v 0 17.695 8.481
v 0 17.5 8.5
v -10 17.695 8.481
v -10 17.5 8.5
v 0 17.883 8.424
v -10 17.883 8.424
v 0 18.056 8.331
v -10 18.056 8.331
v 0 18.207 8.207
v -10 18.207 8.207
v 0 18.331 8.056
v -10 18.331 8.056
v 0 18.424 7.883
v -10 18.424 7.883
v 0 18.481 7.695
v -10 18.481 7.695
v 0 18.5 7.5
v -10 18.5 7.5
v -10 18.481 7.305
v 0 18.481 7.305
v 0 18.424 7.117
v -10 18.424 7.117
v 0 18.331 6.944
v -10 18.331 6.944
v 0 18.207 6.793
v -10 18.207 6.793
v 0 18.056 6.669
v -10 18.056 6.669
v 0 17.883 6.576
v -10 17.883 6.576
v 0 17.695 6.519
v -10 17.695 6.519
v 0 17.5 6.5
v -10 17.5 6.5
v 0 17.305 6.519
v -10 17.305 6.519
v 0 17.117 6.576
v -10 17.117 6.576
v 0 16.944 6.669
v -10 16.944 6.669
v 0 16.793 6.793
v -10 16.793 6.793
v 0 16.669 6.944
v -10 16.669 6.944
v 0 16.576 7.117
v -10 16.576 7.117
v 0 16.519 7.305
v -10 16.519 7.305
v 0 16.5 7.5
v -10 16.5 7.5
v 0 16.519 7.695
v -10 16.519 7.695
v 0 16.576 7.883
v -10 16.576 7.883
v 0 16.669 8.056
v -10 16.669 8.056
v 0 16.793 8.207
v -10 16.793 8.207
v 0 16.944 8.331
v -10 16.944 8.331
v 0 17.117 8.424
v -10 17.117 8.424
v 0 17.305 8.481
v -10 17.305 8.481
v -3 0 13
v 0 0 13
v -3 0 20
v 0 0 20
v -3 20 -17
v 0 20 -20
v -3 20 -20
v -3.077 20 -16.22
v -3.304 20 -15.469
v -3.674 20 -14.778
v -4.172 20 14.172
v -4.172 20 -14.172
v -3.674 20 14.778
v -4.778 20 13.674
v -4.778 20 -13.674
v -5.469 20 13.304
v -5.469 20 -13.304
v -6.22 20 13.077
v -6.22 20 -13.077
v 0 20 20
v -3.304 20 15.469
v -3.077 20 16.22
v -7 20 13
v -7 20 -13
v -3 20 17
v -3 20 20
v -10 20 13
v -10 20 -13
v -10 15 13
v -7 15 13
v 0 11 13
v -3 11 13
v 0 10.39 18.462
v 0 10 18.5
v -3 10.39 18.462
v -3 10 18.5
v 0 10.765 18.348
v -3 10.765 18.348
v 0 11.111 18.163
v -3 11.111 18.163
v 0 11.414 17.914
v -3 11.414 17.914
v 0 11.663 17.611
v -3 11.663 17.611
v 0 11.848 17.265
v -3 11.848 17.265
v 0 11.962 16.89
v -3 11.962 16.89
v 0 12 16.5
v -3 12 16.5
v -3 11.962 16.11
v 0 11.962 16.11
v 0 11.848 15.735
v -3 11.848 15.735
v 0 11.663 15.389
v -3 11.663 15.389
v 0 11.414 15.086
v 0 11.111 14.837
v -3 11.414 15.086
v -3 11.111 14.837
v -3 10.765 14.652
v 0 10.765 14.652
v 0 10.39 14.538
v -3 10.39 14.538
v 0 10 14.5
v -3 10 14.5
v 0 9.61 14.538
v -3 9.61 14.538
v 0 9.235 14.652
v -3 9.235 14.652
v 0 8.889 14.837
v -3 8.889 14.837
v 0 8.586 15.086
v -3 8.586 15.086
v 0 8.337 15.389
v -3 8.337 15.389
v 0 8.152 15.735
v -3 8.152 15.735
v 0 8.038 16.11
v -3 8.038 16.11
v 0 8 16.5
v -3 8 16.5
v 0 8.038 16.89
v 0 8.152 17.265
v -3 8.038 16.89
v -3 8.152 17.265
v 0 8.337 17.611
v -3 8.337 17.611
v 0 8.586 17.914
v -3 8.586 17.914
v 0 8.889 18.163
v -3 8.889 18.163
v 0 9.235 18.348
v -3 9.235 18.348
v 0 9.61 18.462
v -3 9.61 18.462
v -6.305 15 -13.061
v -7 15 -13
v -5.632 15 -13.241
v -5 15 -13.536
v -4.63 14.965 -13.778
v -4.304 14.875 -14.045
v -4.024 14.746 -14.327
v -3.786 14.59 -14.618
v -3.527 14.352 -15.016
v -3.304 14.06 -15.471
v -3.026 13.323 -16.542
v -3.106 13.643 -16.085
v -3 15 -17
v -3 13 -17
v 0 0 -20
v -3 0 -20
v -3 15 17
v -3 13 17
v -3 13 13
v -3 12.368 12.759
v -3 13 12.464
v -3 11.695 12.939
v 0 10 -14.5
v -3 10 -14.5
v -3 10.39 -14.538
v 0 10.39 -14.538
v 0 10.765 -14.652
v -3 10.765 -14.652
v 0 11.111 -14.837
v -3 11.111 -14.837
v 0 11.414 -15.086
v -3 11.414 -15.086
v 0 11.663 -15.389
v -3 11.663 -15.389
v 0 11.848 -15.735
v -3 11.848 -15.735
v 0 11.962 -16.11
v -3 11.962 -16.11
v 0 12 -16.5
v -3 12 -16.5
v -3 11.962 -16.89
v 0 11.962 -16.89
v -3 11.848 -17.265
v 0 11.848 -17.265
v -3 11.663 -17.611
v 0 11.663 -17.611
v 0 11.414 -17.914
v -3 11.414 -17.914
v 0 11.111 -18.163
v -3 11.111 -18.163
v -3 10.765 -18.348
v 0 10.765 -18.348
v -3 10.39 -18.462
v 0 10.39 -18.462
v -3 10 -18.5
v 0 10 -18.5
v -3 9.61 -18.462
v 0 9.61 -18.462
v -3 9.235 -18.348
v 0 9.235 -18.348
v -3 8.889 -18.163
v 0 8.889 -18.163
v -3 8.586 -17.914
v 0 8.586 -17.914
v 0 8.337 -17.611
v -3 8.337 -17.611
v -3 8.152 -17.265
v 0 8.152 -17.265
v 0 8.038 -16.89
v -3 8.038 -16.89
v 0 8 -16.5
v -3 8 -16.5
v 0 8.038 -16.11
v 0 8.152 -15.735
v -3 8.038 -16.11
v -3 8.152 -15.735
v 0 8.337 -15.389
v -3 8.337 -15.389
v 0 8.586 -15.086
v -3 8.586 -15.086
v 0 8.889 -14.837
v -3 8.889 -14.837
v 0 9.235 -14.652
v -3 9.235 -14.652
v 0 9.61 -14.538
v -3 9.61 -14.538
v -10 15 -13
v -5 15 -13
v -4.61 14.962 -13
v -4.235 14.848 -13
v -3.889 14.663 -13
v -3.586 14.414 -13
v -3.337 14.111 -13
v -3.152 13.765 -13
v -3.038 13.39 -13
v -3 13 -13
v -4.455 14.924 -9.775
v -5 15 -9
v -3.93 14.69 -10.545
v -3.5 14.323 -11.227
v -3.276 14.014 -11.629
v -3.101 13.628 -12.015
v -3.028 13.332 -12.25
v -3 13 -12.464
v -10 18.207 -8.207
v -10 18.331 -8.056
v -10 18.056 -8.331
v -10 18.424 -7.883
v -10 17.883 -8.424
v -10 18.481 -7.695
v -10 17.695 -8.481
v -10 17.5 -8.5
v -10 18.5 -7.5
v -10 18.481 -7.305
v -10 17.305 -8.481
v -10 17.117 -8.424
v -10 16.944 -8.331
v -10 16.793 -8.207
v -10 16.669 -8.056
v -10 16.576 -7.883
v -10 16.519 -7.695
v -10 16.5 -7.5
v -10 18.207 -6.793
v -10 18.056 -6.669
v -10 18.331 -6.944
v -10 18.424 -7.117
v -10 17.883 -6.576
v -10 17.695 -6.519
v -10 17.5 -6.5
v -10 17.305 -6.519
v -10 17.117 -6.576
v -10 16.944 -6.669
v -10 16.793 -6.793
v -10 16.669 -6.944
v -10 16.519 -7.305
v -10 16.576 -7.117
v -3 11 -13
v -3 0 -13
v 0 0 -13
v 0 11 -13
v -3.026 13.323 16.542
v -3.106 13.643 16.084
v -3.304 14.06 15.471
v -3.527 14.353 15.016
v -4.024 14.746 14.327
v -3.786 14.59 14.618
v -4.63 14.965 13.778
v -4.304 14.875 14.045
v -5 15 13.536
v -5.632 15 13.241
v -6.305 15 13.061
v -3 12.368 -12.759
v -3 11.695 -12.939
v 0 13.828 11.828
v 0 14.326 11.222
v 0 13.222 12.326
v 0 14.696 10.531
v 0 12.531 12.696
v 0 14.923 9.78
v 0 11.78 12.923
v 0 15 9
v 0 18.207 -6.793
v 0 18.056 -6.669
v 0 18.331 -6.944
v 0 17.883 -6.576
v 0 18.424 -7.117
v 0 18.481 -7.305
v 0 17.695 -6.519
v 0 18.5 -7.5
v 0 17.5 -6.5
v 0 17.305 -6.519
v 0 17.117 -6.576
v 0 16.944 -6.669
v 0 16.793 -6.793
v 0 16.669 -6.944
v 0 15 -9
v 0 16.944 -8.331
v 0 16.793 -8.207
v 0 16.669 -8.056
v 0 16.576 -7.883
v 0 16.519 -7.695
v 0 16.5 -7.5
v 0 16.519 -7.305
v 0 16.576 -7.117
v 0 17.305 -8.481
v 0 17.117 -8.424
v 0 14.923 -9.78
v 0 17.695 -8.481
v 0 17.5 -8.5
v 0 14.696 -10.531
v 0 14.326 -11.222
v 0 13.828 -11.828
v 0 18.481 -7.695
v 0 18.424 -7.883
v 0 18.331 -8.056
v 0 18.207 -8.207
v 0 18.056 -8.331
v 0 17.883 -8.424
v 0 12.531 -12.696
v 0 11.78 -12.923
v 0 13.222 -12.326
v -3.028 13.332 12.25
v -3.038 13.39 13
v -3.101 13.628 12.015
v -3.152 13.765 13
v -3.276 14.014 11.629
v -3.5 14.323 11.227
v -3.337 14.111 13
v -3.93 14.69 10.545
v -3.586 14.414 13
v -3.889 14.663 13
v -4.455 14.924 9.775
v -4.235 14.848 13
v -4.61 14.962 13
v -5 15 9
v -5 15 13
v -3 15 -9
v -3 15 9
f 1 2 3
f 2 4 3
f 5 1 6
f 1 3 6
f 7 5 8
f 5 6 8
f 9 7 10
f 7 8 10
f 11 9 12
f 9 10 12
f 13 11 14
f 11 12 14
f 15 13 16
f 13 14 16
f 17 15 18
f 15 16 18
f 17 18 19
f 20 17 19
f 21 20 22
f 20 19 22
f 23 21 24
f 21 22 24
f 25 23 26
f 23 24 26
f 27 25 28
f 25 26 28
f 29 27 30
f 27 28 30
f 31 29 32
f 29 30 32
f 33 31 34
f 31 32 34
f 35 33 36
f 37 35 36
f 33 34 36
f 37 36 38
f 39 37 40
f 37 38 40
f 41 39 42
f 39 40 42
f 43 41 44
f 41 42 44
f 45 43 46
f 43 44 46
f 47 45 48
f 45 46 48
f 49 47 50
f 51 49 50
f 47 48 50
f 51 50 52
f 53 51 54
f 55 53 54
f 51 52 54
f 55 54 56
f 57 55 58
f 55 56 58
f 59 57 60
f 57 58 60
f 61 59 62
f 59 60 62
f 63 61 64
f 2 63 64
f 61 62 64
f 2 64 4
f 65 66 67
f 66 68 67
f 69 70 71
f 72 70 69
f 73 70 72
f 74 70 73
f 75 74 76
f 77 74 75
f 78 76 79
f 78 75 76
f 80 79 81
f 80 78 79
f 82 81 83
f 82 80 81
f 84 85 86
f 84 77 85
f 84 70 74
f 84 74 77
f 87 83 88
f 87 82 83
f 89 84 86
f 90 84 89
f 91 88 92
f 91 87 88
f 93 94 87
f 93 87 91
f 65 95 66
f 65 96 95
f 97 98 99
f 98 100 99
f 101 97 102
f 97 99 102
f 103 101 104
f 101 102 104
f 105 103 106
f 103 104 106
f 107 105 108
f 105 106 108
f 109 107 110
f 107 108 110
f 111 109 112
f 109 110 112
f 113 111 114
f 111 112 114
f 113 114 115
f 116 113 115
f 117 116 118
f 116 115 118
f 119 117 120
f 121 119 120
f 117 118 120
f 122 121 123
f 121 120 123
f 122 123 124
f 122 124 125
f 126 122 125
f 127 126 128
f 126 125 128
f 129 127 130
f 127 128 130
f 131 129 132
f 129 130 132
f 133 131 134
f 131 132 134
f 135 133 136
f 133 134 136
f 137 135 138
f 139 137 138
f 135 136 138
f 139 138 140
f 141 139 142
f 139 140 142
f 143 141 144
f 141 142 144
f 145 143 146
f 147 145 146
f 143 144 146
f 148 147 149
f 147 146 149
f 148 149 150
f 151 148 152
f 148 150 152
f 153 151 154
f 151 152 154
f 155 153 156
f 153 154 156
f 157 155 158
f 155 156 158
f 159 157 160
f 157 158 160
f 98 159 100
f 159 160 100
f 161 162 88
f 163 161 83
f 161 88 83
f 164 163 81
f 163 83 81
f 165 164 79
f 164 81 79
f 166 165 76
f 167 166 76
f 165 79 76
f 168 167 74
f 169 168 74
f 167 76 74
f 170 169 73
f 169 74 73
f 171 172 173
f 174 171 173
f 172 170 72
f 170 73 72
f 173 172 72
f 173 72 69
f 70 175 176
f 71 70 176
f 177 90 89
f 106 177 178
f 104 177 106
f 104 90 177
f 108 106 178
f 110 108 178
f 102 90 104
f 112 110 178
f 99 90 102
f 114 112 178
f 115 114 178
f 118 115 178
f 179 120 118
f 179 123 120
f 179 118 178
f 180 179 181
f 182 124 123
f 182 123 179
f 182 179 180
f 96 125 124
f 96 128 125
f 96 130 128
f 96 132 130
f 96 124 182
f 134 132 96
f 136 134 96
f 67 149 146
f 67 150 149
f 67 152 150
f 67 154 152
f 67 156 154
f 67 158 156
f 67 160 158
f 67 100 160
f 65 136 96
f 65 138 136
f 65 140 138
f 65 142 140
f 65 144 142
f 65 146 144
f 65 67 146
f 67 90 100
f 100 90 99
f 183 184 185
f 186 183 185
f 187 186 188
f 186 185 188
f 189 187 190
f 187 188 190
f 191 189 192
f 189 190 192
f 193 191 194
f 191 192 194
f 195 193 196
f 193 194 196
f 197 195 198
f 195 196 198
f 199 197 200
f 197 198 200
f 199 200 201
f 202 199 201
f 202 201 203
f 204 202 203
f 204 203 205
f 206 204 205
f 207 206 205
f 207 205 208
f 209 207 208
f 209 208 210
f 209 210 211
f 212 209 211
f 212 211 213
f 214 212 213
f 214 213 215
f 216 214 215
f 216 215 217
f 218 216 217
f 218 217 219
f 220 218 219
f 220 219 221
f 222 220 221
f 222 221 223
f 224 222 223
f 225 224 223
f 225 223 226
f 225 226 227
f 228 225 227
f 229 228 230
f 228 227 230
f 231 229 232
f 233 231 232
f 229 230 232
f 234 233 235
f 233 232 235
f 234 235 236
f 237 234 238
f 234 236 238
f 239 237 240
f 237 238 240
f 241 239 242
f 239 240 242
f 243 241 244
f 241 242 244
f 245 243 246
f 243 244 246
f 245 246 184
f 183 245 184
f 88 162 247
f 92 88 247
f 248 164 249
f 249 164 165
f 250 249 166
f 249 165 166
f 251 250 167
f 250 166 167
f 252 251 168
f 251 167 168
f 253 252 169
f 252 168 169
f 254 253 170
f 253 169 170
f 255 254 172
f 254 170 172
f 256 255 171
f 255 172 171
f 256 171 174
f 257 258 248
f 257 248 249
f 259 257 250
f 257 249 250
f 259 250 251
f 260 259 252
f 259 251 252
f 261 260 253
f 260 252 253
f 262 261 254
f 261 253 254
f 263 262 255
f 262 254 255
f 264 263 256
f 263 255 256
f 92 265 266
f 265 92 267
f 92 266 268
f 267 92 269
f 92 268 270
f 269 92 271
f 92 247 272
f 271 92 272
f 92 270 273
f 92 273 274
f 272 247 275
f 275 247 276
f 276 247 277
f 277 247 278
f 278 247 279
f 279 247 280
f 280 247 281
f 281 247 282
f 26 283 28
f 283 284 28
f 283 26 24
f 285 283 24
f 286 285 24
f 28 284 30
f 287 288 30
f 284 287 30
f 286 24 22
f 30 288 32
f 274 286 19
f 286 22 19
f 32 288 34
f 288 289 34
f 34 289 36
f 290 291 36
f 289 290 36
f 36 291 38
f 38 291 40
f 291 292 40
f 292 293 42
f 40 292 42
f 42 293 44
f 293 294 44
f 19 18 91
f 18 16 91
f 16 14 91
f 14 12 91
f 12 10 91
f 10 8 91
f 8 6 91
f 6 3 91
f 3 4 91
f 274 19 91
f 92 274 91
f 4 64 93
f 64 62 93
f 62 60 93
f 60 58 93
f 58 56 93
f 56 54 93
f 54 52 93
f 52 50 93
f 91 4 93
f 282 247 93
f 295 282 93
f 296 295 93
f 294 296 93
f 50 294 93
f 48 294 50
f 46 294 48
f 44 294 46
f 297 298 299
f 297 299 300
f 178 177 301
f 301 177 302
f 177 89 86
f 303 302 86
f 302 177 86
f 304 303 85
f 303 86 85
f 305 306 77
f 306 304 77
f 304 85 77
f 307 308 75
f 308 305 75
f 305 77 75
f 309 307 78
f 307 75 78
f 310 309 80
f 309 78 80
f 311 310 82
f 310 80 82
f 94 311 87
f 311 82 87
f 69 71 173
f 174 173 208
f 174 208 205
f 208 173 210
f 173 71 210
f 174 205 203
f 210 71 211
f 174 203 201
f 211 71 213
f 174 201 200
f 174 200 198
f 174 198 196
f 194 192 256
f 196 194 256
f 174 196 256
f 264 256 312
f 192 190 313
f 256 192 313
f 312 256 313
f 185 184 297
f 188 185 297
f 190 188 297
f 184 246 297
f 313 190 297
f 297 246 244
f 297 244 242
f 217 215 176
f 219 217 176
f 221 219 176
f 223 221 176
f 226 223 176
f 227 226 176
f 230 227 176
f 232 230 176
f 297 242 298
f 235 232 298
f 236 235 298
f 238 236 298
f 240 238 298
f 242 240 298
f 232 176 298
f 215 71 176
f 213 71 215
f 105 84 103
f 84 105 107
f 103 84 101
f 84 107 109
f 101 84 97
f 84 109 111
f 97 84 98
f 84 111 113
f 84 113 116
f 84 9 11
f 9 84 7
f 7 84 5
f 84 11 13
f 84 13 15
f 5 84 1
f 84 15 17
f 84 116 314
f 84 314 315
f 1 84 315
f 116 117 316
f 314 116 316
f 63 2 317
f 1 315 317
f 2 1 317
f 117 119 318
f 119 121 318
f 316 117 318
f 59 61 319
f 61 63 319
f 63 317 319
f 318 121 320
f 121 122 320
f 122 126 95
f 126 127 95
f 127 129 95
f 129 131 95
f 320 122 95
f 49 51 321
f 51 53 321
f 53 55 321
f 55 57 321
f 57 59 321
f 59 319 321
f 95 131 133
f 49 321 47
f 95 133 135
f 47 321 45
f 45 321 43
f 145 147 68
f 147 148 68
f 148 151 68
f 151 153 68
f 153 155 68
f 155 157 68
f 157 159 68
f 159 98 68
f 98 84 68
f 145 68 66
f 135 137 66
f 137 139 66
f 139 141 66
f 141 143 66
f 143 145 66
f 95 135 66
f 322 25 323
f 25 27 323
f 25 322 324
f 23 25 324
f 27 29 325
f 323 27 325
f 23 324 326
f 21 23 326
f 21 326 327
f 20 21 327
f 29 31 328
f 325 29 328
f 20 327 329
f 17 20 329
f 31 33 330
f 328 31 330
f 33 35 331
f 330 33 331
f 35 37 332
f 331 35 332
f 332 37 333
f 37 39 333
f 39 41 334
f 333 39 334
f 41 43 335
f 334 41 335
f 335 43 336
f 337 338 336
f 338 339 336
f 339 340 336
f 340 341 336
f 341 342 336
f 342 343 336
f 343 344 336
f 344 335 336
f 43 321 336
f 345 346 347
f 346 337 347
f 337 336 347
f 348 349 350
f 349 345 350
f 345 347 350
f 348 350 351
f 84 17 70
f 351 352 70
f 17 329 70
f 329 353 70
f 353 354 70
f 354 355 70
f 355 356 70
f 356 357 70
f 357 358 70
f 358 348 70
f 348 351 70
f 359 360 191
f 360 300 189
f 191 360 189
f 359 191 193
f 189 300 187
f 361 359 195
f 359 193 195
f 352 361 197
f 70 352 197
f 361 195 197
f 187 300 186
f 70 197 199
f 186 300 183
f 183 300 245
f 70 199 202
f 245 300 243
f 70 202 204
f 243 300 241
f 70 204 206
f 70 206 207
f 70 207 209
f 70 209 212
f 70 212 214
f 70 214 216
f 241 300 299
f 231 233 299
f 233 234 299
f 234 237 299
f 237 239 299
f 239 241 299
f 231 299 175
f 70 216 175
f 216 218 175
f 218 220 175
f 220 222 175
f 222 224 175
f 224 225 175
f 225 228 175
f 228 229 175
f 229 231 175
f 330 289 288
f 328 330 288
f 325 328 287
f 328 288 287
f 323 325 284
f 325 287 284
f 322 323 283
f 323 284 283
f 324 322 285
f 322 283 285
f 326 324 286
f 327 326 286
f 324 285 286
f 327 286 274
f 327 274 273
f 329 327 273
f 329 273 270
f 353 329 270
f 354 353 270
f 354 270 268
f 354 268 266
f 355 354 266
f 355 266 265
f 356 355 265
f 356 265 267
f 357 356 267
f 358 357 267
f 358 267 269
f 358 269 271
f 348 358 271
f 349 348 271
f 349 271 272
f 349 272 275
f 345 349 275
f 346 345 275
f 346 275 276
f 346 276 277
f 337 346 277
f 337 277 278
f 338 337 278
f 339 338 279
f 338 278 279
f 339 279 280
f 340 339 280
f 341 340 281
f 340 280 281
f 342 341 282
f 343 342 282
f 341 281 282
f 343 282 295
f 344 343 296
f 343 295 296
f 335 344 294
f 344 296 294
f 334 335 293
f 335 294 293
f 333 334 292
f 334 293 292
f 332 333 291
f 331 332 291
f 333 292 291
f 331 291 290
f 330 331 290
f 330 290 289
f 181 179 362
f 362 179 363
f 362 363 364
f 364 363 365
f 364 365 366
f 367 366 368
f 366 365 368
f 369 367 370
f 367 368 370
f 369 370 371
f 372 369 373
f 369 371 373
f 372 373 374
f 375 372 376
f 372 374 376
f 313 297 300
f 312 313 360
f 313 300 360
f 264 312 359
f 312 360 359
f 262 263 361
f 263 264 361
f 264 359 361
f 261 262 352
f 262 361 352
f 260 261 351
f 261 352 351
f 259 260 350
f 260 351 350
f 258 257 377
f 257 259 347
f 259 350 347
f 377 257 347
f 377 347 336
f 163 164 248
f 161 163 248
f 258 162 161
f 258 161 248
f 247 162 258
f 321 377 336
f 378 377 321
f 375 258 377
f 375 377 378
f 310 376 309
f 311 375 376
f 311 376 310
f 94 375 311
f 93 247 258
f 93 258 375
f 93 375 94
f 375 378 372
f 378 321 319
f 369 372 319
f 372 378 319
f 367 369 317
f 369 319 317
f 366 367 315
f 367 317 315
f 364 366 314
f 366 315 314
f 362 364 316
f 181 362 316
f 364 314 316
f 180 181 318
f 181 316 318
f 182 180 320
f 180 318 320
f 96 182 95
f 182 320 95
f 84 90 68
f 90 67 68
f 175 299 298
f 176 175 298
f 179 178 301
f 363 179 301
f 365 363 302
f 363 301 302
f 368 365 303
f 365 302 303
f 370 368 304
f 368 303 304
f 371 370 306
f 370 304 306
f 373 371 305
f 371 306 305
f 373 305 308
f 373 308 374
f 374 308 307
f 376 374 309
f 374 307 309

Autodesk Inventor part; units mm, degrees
ref_plane "YZ Plane" through (0, 0, 0) normal (1, 0, 0) x (0, 1, 0)
ref_plane "XZ Plane" through (0, 0, 0) normal (0, 1, 0) x (-1, 0, 0)
ref_plane "XY Plane" through (0, 0, 0) normal (0, 0, 1) x (1, 0, 0)
sketch "Sketch1" plane through (0, 0, 0) normal (0, 1, 0) x (-1, 0, 0)
  line L0 (10, 20) -> (0, 20)
  line L1 (0, 20) -> (0, -20)
  line L2 (0, -20) -> (10, -20)
  line L3 (10, -20) -> (10, 20)
  line L4 (10, 20) -> (3, 20)
  line L5 (3, 20) -> (3, 13)
  line L6 (3, 13) -> (10, 13)
  line L7 (10, 13) -> (10, 20)
  line L8 (10, -20) -> (3, -20)
  line L9 (3, -20) -> (3, -13)
  line L10 (3, -13) -> (10, -13)
  line L11 (10, -13) -> (10, -20)
  point P0 (0, 0)
  point P1 (0, 0)
  dimension "d0" = 10
  dimension "d1" = 40
  dimension "d2" = 7
  dimension "d3" = 7
  dimension "d4" = 7
  dimension "d5" = 7
extrude "Extrusion1" add sketch "Sketch1" along normal blind 20 contours L5 L6 L3 L10 L9 L2 L1 L0
sketch "Sketch2" plane through (-10, 0, -13) normal (-1, 0, 0) x (0, 0, 1)
  line L0 (0, 0) -> (26, 0) projected
  line L1 (0, 0) -> (0, 20) projected
  line L2 (26, 0) -> (0, 0)
  line L3 (0, 0) -> (0, 15)
  line L4 (0, 15) -> (26, 15)
  line L5 (26, 15) -> (26, 0)
  circle A0 centre (29.5, 10) radius 2
  circle A1 centre (-3.5, 10) radius 2
  line L6 (-7, 0) -> (-7, 20) projected
  line L7 (26, 0) -> (33, 0) projected
  line L8 (-7, 0) -> (0, 0) projected
  point P0 (13, 0)
  point P1 (-7, 10)
  point P2 (29.5, 0)
  point P3 (-3.5, 0)
  dimension "d8" = 15
  dimension "d9" = 4
  dimension "d10" = 4
extrude "Extrusion2" cut sketch "Sketch2" against normal through all
sketch "Sketch3" plane through (-10, 20, -13) normal (-1, 0, 0) x (0, 0, 1)
  circle A0 centre (20.5, -2.5) radius 1
  circle A1 centre (5.5, -2.5) radius 1
  line L0 (0, -5) -> (0, 0) projected
  line L1 (20.5, -2.5) -> (5.5, -2.5)
  line L2 (0, -5) -> (26, -5) projected
  point P0 (13, -20)
  point P1 (0, -2.5)
  point P2 (13, -2.5)
  point P3 (13, -5)
  dimension "d13" = 2
  dimension "d14" = 2
  dimension "d15" = 15
extrude "Extrusion3" cut sketch "Sketch3" against normal through all
fillet "Fillet1" radius 4 4 edges at (-3, 17.5, -13) (-3, 17.5, 13) (-1.5, 15, -13) (-1.5, 15, 13)
fillet "Fillet2" radius 2 4 edges at (-3, 15, 15) (-3, 15, 11) (-3, 15, -15) (-3, 15, -11)
properties part number "mpu6050"
